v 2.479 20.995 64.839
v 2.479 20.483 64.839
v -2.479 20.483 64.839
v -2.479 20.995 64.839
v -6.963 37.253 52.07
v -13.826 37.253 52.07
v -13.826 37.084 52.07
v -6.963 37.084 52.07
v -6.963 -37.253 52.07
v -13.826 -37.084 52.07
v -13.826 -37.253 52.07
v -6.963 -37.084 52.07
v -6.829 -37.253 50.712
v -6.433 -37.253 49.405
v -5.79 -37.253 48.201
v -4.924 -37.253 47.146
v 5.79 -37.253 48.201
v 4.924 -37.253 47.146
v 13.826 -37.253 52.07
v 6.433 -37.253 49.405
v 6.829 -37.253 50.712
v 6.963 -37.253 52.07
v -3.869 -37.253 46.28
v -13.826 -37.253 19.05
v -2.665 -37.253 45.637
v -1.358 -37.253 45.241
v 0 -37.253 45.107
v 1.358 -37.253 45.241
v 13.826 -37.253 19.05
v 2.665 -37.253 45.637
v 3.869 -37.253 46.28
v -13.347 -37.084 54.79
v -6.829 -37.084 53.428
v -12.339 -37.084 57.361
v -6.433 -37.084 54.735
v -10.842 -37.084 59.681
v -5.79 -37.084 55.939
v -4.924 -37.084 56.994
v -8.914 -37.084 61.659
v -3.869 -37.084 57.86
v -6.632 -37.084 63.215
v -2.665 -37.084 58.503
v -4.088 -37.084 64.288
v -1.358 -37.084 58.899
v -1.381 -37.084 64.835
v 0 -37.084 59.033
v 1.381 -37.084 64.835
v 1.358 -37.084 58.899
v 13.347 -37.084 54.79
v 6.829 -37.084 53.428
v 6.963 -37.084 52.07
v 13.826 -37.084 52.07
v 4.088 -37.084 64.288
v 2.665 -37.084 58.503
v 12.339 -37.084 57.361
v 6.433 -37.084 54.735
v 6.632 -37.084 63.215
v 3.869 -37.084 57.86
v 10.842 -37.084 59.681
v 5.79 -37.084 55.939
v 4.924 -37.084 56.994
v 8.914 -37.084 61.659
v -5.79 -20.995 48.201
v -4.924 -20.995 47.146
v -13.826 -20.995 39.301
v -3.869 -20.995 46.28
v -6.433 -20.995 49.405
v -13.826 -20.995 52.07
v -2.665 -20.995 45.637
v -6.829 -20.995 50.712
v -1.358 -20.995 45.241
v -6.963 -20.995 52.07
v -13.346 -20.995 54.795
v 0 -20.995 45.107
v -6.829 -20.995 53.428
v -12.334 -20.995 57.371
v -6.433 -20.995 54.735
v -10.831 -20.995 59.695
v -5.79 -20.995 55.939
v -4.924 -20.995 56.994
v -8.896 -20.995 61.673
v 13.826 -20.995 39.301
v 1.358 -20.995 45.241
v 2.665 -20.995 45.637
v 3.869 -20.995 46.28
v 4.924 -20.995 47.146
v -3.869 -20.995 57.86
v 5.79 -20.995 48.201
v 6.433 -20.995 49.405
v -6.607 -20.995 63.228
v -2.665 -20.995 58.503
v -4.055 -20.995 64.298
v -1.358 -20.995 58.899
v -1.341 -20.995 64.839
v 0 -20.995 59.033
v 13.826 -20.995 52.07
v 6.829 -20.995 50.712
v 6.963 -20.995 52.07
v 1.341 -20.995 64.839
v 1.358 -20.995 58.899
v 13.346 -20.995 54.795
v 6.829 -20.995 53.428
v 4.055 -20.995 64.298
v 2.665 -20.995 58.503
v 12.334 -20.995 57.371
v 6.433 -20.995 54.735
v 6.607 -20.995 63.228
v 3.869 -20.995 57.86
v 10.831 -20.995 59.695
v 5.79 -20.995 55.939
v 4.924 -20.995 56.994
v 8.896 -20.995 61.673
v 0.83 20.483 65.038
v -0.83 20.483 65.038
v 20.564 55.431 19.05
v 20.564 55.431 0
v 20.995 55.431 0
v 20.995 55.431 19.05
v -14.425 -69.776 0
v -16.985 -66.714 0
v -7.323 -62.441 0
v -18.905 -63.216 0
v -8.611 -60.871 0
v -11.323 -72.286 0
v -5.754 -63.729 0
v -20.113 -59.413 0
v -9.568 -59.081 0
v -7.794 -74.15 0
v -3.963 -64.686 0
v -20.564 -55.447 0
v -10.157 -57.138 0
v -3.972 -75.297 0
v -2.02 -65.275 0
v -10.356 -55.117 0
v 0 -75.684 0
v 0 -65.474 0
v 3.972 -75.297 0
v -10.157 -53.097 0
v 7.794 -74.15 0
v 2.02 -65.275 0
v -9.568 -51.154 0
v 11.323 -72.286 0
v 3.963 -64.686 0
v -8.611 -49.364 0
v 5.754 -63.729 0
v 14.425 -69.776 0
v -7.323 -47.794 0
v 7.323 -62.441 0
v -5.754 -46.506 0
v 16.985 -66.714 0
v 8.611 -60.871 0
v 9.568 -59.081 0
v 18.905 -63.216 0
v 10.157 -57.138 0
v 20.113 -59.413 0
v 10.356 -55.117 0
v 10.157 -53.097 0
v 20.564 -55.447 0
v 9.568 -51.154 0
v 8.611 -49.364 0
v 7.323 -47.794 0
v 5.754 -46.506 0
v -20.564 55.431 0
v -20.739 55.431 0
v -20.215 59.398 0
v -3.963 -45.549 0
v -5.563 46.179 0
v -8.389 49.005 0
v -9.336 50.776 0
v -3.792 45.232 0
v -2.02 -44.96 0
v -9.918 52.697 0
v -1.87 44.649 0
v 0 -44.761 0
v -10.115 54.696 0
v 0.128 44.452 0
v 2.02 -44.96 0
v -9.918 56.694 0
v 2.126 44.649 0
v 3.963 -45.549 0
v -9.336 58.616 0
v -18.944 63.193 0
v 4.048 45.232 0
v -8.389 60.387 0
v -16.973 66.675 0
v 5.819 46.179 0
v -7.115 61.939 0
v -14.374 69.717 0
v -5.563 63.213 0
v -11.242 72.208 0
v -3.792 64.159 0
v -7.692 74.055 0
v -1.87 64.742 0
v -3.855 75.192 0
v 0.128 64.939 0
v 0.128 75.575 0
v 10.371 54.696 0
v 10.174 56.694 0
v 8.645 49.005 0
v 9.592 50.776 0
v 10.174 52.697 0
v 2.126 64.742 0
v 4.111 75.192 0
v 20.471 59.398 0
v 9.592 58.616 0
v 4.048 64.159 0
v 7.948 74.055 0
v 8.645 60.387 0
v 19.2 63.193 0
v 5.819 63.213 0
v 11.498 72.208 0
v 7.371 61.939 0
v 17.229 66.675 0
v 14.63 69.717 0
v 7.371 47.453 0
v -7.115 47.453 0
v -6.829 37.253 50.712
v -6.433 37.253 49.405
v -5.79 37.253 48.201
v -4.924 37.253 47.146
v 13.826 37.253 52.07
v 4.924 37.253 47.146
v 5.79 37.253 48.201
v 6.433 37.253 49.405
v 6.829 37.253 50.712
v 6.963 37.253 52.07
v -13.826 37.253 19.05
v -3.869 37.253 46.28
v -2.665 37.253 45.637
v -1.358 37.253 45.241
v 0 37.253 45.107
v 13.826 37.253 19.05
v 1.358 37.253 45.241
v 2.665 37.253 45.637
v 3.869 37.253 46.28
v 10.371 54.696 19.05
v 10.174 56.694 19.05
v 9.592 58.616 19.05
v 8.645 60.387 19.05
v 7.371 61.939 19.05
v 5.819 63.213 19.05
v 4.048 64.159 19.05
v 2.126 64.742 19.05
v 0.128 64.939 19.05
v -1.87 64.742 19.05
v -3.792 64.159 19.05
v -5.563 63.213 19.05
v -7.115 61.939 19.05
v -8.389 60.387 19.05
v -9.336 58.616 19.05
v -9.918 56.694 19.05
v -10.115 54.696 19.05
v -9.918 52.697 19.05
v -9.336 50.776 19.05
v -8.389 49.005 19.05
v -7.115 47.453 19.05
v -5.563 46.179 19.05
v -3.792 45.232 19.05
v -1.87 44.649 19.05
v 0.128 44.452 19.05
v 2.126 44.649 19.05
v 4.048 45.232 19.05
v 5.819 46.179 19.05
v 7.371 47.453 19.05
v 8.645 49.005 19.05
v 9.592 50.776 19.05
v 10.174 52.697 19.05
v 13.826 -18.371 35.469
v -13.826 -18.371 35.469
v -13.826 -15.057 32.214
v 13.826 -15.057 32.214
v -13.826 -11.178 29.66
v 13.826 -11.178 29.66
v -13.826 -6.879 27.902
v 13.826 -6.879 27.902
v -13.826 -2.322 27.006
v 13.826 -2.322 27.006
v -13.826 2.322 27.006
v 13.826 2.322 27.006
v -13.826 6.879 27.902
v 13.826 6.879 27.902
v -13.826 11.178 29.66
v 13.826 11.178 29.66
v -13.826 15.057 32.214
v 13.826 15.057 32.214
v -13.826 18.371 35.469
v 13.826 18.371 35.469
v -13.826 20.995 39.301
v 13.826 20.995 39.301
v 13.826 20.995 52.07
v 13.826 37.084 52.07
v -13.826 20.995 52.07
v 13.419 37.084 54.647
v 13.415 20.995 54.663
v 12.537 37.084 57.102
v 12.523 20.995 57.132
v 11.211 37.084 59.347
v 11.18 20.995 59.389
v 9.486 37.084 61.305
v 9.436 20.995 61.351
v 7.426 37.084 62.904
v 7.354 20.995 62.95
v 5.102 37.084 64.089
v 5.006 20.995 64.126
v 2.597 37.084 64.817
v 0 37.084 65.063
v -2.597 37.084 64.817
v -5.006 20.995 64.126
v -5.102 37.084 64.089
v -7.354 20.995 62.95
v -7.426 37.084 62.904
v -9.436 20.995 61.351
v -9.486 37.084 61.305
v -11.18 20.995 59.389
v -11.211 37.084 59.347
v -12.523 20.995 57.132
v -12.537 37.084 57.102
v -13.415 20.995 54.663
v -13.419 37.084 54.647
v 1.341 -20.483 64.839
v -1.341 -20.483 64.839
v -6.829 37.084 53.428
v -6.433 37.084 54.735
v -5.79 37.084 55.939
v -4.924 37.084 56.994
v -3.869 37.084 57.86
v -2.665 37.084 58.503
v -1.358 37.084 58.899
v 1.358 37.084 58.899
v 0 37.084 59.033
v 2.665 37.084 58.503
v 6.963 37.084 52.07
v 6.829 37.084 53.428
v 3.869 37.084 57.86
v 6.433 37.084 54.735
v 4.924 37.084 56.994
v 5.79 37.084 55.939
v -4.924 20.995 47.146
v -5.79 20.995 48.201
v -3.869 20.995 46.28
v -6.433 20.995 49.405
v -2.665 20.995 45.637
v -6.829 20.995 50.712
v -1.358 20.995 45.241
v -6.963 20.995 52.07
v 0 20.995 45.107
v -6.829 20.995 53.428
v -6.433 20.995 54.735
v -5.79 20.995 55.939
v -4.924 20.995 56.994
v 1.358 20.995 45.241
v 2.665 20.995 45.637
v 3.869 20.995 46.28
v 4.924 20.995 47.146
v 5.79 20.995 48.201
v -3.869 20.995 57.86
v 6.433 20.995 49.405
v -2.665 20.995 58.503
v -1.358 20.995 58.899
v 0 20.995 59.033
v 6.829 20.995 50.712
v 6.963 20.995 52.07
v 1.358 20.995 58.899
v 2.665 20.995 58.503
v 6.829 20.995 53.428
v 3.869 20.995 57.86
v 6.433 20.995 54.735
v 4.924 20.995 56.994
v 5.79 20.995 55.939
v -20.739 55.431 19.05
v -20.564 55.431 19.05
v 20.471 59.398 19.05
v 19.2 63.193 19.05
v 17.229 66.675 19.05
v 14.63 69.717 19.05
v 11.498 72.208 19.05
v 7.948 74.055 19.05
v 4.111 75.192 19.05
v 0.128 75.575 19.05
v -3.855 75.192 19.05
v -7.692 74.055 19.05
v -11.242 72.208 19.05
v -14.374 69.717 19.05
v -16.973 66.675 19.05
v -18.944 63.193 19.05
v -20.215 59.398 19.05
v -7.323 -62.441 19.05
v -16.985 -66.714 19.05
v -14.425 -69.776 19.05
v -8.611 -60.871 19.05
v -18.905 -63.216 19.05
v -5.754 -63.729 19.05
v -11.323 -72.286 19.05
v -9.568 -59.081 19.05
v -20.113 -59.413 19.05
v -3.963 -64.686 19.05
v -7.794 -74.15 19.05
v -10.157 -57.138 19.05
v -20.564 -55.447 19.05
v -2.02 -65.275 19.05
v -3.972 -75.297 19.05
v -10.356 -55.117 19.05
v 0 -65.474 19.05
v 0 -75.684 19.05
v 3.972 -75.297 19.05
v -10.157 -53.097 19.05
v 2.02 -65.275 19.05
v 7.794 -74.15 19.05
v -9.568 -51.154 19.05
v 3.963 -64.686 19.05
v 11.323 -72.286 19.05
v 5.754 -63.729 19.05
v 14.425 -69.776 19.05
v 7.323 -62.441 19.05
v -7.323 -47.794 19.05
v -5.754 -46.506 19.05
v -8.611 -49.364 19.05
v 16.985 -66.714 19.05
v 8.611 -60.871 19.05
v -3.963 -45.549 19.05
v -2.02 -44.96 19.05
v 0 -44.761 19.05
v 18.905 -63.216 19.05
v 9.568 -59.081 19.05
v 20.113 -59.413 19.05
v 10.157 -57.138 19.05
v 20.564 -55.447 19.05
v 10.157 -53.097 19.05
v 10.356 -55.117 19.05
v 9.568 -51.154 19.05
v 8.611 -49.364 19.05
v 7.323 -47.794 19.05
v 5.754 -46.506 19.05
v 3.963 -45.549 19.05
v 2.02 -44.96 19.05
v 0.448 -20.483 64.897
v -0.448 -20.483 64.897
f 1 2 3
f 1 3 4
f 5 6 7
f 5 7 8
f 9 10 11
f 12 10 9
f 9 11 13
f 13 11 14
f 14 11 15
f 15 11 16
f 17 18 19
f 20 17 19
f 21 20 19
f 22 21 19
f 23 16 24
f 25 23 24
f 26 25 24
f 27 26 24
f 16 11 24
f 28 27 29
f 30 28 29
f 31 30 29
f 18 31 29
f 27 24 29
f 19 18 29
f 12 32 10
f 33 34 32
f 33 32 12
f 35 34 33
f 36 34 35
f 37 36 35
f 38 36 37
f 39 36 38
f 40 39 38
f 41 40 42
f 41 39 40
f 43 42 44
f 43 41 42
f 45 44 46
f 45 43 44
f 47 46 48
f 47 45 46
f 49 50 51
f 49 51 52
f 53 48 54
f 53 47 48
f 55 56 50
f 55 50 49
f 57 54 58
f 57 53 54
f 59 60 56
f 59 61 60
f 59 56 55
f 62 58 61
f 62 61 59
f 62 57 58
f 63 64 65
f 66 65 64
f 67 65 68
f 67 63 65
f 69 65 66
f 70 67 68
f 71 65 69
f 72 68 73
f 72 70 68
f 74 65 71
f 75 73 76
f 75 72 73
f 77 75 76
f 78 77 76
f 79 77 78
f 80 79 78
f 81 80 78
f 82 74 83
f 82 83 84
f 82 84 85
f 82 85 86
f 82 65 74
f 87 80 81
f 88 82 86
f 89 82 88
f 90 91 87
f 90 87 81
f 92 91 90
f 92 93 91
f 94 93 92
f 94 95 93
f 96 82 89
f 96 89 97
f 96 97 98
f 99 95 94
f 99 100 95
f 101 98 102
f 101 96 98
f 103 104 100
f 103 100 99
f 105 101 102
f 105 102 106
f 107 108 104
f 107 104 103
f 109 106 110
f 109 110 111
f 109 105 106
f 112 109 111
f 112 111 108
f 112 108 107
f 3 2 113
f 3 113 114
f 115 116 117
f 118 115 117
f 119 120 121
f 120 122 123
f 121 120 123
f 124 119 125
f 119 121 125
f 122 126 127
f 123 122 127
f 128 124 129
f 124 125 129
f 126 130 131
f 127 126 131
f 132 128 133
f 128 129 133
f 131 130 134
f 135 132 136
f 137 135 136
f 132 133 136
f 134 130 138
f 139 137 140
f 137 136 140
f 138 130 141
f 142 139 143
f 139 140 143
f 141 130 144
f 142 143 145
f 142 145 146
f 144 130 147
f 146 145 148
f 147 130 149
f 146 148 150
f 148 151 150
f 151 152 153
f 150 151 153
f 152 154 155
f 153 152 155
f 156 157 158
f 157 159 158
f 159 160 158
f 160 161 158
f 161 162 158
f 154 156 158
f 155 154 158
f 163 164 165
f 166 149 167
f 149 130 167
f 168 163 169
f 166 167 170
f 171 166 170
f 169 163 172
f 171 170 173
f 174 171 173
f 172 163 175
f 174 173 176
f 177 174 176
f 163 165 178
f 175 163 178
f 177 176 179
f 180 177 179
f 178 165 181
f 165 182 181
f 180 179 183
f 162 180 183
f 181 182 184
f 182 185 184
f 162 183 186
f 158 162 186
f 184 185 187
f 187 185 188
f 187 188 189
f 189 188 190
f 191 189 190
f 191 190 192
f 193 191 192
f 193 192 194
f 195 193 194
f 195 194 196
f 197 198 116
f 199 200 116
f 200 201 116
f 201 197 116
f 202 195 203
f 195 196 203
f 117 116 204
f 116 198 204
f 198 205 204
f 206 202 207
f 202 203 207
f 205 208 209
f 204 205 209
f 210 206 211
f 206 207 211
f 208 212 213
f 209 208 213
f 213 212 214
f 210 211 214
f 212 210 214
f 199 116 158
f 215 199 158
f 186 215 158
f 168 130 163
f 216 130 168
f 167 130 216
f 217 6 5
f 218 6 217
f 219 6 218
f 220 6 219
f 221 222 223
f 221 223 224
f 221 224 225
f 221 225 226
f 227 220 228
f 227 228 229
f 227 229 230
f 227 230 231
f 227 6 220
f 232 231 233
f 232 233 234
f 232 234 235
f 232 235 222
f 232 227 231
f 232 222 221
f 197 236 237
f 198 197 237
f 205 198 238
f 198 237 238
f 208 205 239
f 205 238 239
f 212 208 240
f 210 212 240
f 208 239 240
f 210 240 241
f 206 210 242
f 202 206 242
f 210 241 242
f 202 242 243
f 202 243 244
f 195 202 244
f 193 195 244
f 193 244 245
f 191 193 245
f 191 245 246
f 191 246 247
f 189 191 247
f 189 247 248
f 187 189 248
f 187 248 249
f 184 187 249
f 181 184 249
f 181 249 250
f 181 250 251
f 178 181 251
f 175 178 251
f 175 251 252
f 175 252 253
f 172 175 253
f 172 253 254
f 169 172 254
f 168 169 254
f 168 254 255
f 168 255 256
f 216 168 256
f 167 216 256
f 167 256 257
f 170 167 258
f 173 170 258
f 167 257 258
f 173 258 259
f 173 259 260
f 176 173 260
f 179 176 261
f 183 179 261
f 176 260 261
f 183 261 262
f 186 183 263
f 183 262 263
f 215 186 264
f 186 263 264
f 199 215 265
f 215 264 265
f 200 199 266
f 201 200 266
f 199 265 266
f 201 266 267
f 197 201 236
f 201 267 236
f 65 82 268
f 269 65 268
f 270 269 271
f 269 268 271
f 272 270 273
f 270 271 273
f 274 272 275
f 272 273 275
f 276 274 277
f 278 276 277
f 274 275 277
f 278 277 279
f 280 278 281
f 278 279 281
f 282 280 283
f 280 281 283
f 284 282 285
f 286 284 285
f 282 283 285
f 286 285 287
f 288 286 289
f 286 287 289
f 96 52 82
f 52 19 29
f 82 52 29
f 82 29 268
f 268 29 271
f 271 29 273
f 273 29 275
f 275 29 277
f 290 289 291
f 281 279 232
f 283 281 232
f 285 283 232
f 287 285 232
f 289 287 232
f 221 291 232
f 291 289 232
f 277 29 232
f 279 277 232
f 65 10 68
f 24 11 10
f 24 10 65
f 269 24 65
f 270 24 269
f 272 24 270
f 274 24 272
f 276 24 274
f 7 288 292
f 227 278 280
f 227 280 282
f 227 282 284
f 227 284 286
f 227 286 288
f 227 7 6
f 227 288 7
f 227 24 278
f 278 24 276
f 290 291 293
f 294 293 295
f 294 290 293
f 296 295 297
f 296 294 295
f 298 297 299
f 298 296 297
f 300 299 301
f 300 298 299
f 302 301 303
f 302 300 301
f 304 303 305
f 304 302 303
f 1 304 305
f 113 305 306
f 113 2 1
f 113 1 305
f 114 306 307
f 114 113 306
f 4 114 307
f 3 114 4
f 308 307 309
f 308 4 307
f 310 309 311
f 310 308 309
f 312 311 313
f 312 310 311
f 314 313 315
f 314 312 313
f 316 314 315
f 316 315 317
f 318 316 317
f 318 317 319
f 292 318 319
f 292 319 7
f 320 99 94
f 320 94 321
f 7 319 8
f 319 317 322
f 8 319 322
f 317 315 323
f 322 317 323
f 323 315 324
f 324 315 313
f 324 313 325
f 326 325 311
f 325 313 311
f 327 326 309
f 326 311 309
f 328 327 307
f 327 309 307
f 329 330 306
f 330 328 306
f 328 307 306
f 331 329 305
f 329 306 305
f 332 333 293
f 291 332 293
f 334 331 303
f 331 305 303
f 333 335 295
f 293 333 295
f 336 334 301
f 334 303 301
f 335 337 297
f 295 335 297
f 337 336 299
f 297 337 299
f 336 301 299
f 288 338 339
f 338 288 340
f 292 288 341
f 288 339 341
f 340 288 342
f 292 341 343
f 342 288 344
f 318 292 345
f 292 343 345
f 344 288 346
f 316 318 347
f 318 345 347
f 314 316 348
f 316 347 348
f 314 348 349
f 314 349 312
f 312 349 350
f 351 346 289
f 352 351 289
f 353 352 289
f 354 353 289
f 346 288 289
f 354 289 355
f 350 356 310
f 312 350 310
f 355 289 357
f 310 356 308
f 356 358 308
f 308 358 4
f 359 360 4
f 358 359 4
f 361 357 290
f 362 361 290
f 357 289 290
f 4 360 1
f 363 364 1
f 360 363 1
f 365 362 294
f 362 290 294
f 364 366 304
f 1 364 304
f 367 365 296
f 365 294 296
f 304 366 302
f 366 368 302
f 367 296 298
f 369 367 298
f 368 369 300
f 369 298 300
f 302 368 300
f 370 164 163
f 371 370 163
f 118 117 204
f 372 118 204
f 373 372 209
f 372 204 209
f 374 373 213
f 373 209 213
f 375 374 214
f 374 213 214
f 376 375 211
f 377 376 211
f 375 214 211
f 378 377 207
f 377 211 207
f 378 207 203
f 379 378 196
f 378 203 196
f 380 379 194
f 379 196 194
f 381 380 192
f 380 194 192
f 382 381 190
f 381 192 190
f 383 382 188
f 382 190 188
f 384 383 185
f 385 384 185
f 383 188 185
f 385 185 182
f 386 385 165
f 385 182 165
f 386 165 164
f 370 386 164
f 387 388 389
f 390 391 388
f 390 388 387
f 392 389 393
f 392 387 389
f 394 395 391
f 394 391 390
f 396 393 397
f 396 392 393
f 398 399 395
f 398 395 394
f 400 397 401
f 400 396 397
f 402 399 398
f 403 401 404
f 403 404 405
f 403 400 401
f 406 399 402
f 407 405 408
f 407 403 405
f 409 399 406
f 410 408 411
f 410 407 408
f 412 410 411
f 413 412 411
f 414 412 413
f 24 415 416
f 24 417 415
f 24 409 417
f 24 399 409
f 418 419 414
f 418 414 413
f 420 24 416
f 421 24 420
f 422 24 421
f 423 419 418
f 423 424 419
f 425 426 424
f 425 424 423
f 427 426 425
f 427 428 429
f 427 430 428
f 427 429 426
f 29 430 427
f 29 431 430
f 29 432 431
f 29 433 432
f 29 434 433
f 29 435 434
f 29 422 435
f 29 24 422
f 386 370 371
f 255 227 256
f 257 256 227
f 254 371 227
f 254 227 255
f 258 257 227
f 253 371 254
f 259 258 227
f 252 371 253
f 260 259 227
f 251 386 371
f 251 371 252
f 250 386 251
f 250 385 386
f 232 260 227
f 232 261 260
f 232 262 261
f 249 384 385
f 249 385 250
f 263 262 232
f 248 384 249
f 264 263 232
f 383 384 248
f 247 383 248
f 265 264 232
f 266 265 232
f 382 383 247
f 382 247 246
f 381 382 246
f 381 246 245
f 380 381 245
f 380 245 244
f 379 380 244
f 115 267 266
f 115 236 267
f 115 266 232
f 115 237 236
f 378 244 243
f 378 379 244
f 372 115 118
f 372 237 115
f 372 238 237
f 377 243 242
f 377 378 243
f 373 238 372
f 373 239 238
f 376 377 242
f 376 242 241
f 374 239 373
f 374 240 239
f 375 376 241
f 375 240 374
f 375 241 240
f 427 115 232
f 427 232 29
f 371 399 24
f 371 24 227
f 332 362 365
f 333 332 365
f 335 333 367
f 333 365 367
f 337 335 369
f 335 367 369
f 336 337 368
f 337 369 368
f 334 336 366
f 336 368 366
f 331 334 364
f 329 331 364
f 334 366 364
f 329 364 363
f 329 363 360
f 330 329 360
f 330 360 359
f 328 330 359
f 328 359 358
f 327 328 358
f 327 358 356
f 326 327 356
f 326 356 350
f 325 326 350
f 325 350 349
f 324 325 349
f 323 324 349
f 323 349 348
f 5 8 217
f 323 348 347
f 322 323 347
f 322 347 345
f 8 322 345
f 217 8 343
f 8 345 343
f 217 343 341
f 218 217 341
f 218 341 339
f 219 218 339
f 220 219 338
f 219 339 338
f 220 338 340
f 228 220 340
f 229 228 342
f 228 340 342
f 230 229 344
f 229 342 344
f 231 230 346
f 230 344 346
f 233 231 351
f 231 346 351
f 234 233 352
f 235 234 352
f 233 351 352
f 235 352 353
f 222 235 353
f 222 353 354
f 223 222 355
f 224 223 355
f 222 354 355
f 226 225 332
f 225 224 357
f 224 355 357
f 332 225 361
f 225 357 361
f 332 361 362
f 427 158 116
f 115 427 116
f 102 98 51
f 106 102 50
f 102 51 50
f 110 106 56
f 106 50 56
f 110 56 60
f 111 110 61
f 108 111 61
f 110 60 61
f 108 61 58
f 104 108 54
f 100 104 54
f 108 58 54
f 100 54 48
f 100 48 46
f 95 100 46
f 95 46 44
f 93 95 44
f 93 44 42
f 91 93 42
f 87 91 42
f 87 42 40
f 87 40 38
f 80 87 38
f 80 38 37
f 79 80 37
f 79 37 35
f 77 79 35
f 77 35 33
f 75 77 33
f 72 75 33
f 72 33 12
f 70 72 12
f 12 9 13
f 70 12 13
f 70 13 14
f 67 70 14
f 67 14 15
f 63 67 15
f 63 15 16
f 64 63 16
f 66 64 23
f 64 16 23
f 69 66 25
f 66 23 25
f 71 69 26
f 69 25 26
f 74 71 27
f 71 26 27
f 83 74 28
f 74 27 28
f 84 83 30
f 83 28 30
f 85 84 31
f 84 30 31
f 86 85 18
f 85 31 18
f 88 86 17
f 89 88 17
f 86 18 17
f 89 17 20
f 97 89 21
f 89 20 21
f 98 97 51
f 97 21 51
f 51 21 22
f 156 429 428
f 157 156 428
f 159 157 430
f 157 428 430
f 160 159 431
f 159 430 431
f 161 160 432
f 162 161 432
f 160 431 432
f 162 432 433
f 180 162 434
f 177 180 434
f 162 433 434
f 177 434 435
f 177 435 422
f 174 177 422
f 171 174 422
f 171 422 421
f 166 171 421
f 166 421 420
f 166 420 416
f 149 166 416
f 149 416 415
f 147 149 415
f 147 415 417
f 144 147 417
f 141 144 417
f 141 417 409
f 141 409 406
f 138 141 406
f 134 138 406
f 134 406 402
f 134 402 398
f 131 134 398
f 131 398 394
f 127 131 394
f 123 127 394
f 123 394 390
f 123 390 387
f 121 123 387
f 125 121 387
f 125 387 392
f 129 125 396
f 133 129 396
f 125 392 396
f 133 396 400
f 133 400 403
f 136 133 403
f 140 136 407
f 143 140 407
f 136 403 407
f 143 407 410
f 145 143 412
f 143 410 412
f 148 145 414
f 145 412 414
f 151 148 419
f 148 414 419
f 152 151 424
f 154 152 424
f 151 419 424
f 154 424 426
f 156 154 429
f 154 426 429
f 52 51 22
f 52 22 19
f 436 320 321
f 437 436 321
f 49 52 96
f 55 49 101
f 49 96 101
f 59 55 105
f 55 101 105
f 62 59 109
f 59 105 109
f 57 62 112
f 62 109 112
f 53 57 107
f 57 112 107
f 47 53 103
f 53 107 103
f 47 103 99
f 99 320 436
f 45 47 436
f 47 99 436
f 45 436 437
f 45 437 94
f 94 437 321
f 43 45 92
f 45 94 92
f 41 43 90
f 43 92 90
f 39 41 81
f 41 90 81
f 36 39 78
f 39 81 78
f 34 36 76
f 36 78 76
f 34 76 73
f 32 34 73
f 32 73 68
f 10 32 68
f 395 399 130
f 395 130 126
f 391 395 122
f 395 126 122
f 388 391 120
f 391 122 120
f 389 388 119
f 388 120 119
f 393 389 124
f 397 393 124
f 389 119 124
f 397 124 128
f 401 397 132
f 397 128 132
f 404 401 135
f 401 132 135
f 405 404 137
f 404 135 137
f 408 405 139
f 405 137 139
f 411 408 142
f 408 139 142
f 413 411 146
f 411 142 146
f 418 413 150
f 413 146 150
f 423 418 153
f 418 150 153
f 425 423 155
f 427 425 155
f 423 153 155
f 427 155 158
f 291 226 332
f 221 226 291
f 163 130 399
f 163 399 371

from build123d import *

# Parameters (mm, degrees)
F0_W      = 41.12726
F0_H      = 110.894836
F1_DEPTH  = 19.05
F3_DEPTH  = 19.05
F5_DEPTH  = 19.05
F6_W      = 27.651456
F6_H      = 74.505314
F7_DEPTH  = 33.02
F9_DEPTH  = 37.084
F11_DEPTH = 37.084
F12_R     = 6.963256
F13_DEPTH = 112.828874
F14_W     = 41.989248
F14_H     = 25.538178
F15_DEPTH = 34.56532
F16_W     = 40.965122
F16_H     = 20.482562
F17_DEPTH = 34.821354
F18_R     = 10.243282
F19_DEPTH = 19.051
F20_R     = 10.356495
F21_DEPTH = 19.051


with BuildPart() as f1:
    # F0 (on Top) → F1 (new body)
    with BuildSketch(Plane.XY):
        Rectangle(F0_W, F0_H)
    extrude(amount=F1_DEPTH)

    # F2 (on Top) → F3 (join)
    with BuildSketch(Plane.XY):
        with BuildLine():
            Line((-20.738592, 55.430926), (20.994626, 55.430926))
            ThreePointArc((20.994626, 55.430926), (0.128017, 75.575216), (-20.738592, 55.430926))
        make_face()
    extrude(amount=F3_DEPTH)

    # F4 (on Top) → F5 (join)
    with BuildSketch(Plane.XY):
        with BuildLine():
            ThreePointArc((-20.56363, -55.447418), (0, -75.683733), (20.56363, -55.447418))
            Line((20.56363, -55.447418), (-20.56363, -55.447418))
        make_face()
    extrude(amount=F5_DEPTH)

    # F6 (on face) → F7 (join)
    with BuildSketch(Plane.XY.offset(19.05)):
        Rectangle(F6_W, F6_H)
    extrude(amount=F7_DEPTH)

    # F8 (on Front) → F9 (join)
    with BuildSketch(Plane.XZ):
        with BuildLine():
            Line((-13.825728, 52.07), (13.825728, 52.07))
            ThreePointArc((13.825728, 52.07), (0, 64.904116), (-13.825728, 52.07))
        make_face()
    extrude(amount=F9_DEPTH)

    # F10 (on Front) → F11 (join)
    with BuildSketch(Plane.XZ):
        with BuildLine():
            Line((-13.825728, 52.07), (13.825728, 52.07))
            ThreePointArc((13.825728, 52.07), (0, 65.062803), (-13.825728, 52.07))
        make_face()
    extrude(amount=-F11_DEPTH)

    # F12 (on face) → F13 (cut, through all)
    with BuildSketch(Plane.XZ.offset(37.252657)):
        with Locations((0, 52.07)):
            Circle(F12_R)
    extrude(amount=-F13_DEPTH, mode=Mode.SUBTRACT)

    # F14 (on face) → F15 (cut, through all)
    with BuildSketch(Plane.YZ.offset(13.825728)):
        with Locations((0, 52.07)):
            Rectangle(F14_W, F14_H)
        with BuildLine():
            Line((20.994624, 39.300911), (-20.994624, 39.300911))
            ThreePointArc((-20.994624, 39.300911), (0, 26.893632), (20.994624, 39.300911))
        make_face()
    extrude(amount=-F15_DEPTH, mode=Mode.SUBTRACT)

    # F16 (on face) → F17 (cut, through all)
    with BuildSketch(Plane(origin=(-13.825728, 0, 0), x_dir=(0, -1, 0), z_dir=(-1, 0, 0))):
        with Locations((0, 56.711089)):
            Rectangle(F16_W, F16_H)
    extrude(amount=-F17_DEPTH, mode=Mode.SUBTRACT)

    # F18 (on face) → F19 (cut, through all)
    with BuildSketch(Plane.XY.offset(19.05)):
        with Locations((0.128017, 54.695657)):
            Circle(F18_R)
    extrude(amount=-F19_DEPTH, mode=Mode.SUBTRACT)

    # F20 (on face) → F21 (cut, through all)
    with BuildSketch(Plane.XY.offset(19.05)):
        with Locations((0, -55.117455)):
            Circle(F20_R)
    extrude(amount=-F21_DEPTH, mode=Mode.SUBTRACT)


solid = f1.part
